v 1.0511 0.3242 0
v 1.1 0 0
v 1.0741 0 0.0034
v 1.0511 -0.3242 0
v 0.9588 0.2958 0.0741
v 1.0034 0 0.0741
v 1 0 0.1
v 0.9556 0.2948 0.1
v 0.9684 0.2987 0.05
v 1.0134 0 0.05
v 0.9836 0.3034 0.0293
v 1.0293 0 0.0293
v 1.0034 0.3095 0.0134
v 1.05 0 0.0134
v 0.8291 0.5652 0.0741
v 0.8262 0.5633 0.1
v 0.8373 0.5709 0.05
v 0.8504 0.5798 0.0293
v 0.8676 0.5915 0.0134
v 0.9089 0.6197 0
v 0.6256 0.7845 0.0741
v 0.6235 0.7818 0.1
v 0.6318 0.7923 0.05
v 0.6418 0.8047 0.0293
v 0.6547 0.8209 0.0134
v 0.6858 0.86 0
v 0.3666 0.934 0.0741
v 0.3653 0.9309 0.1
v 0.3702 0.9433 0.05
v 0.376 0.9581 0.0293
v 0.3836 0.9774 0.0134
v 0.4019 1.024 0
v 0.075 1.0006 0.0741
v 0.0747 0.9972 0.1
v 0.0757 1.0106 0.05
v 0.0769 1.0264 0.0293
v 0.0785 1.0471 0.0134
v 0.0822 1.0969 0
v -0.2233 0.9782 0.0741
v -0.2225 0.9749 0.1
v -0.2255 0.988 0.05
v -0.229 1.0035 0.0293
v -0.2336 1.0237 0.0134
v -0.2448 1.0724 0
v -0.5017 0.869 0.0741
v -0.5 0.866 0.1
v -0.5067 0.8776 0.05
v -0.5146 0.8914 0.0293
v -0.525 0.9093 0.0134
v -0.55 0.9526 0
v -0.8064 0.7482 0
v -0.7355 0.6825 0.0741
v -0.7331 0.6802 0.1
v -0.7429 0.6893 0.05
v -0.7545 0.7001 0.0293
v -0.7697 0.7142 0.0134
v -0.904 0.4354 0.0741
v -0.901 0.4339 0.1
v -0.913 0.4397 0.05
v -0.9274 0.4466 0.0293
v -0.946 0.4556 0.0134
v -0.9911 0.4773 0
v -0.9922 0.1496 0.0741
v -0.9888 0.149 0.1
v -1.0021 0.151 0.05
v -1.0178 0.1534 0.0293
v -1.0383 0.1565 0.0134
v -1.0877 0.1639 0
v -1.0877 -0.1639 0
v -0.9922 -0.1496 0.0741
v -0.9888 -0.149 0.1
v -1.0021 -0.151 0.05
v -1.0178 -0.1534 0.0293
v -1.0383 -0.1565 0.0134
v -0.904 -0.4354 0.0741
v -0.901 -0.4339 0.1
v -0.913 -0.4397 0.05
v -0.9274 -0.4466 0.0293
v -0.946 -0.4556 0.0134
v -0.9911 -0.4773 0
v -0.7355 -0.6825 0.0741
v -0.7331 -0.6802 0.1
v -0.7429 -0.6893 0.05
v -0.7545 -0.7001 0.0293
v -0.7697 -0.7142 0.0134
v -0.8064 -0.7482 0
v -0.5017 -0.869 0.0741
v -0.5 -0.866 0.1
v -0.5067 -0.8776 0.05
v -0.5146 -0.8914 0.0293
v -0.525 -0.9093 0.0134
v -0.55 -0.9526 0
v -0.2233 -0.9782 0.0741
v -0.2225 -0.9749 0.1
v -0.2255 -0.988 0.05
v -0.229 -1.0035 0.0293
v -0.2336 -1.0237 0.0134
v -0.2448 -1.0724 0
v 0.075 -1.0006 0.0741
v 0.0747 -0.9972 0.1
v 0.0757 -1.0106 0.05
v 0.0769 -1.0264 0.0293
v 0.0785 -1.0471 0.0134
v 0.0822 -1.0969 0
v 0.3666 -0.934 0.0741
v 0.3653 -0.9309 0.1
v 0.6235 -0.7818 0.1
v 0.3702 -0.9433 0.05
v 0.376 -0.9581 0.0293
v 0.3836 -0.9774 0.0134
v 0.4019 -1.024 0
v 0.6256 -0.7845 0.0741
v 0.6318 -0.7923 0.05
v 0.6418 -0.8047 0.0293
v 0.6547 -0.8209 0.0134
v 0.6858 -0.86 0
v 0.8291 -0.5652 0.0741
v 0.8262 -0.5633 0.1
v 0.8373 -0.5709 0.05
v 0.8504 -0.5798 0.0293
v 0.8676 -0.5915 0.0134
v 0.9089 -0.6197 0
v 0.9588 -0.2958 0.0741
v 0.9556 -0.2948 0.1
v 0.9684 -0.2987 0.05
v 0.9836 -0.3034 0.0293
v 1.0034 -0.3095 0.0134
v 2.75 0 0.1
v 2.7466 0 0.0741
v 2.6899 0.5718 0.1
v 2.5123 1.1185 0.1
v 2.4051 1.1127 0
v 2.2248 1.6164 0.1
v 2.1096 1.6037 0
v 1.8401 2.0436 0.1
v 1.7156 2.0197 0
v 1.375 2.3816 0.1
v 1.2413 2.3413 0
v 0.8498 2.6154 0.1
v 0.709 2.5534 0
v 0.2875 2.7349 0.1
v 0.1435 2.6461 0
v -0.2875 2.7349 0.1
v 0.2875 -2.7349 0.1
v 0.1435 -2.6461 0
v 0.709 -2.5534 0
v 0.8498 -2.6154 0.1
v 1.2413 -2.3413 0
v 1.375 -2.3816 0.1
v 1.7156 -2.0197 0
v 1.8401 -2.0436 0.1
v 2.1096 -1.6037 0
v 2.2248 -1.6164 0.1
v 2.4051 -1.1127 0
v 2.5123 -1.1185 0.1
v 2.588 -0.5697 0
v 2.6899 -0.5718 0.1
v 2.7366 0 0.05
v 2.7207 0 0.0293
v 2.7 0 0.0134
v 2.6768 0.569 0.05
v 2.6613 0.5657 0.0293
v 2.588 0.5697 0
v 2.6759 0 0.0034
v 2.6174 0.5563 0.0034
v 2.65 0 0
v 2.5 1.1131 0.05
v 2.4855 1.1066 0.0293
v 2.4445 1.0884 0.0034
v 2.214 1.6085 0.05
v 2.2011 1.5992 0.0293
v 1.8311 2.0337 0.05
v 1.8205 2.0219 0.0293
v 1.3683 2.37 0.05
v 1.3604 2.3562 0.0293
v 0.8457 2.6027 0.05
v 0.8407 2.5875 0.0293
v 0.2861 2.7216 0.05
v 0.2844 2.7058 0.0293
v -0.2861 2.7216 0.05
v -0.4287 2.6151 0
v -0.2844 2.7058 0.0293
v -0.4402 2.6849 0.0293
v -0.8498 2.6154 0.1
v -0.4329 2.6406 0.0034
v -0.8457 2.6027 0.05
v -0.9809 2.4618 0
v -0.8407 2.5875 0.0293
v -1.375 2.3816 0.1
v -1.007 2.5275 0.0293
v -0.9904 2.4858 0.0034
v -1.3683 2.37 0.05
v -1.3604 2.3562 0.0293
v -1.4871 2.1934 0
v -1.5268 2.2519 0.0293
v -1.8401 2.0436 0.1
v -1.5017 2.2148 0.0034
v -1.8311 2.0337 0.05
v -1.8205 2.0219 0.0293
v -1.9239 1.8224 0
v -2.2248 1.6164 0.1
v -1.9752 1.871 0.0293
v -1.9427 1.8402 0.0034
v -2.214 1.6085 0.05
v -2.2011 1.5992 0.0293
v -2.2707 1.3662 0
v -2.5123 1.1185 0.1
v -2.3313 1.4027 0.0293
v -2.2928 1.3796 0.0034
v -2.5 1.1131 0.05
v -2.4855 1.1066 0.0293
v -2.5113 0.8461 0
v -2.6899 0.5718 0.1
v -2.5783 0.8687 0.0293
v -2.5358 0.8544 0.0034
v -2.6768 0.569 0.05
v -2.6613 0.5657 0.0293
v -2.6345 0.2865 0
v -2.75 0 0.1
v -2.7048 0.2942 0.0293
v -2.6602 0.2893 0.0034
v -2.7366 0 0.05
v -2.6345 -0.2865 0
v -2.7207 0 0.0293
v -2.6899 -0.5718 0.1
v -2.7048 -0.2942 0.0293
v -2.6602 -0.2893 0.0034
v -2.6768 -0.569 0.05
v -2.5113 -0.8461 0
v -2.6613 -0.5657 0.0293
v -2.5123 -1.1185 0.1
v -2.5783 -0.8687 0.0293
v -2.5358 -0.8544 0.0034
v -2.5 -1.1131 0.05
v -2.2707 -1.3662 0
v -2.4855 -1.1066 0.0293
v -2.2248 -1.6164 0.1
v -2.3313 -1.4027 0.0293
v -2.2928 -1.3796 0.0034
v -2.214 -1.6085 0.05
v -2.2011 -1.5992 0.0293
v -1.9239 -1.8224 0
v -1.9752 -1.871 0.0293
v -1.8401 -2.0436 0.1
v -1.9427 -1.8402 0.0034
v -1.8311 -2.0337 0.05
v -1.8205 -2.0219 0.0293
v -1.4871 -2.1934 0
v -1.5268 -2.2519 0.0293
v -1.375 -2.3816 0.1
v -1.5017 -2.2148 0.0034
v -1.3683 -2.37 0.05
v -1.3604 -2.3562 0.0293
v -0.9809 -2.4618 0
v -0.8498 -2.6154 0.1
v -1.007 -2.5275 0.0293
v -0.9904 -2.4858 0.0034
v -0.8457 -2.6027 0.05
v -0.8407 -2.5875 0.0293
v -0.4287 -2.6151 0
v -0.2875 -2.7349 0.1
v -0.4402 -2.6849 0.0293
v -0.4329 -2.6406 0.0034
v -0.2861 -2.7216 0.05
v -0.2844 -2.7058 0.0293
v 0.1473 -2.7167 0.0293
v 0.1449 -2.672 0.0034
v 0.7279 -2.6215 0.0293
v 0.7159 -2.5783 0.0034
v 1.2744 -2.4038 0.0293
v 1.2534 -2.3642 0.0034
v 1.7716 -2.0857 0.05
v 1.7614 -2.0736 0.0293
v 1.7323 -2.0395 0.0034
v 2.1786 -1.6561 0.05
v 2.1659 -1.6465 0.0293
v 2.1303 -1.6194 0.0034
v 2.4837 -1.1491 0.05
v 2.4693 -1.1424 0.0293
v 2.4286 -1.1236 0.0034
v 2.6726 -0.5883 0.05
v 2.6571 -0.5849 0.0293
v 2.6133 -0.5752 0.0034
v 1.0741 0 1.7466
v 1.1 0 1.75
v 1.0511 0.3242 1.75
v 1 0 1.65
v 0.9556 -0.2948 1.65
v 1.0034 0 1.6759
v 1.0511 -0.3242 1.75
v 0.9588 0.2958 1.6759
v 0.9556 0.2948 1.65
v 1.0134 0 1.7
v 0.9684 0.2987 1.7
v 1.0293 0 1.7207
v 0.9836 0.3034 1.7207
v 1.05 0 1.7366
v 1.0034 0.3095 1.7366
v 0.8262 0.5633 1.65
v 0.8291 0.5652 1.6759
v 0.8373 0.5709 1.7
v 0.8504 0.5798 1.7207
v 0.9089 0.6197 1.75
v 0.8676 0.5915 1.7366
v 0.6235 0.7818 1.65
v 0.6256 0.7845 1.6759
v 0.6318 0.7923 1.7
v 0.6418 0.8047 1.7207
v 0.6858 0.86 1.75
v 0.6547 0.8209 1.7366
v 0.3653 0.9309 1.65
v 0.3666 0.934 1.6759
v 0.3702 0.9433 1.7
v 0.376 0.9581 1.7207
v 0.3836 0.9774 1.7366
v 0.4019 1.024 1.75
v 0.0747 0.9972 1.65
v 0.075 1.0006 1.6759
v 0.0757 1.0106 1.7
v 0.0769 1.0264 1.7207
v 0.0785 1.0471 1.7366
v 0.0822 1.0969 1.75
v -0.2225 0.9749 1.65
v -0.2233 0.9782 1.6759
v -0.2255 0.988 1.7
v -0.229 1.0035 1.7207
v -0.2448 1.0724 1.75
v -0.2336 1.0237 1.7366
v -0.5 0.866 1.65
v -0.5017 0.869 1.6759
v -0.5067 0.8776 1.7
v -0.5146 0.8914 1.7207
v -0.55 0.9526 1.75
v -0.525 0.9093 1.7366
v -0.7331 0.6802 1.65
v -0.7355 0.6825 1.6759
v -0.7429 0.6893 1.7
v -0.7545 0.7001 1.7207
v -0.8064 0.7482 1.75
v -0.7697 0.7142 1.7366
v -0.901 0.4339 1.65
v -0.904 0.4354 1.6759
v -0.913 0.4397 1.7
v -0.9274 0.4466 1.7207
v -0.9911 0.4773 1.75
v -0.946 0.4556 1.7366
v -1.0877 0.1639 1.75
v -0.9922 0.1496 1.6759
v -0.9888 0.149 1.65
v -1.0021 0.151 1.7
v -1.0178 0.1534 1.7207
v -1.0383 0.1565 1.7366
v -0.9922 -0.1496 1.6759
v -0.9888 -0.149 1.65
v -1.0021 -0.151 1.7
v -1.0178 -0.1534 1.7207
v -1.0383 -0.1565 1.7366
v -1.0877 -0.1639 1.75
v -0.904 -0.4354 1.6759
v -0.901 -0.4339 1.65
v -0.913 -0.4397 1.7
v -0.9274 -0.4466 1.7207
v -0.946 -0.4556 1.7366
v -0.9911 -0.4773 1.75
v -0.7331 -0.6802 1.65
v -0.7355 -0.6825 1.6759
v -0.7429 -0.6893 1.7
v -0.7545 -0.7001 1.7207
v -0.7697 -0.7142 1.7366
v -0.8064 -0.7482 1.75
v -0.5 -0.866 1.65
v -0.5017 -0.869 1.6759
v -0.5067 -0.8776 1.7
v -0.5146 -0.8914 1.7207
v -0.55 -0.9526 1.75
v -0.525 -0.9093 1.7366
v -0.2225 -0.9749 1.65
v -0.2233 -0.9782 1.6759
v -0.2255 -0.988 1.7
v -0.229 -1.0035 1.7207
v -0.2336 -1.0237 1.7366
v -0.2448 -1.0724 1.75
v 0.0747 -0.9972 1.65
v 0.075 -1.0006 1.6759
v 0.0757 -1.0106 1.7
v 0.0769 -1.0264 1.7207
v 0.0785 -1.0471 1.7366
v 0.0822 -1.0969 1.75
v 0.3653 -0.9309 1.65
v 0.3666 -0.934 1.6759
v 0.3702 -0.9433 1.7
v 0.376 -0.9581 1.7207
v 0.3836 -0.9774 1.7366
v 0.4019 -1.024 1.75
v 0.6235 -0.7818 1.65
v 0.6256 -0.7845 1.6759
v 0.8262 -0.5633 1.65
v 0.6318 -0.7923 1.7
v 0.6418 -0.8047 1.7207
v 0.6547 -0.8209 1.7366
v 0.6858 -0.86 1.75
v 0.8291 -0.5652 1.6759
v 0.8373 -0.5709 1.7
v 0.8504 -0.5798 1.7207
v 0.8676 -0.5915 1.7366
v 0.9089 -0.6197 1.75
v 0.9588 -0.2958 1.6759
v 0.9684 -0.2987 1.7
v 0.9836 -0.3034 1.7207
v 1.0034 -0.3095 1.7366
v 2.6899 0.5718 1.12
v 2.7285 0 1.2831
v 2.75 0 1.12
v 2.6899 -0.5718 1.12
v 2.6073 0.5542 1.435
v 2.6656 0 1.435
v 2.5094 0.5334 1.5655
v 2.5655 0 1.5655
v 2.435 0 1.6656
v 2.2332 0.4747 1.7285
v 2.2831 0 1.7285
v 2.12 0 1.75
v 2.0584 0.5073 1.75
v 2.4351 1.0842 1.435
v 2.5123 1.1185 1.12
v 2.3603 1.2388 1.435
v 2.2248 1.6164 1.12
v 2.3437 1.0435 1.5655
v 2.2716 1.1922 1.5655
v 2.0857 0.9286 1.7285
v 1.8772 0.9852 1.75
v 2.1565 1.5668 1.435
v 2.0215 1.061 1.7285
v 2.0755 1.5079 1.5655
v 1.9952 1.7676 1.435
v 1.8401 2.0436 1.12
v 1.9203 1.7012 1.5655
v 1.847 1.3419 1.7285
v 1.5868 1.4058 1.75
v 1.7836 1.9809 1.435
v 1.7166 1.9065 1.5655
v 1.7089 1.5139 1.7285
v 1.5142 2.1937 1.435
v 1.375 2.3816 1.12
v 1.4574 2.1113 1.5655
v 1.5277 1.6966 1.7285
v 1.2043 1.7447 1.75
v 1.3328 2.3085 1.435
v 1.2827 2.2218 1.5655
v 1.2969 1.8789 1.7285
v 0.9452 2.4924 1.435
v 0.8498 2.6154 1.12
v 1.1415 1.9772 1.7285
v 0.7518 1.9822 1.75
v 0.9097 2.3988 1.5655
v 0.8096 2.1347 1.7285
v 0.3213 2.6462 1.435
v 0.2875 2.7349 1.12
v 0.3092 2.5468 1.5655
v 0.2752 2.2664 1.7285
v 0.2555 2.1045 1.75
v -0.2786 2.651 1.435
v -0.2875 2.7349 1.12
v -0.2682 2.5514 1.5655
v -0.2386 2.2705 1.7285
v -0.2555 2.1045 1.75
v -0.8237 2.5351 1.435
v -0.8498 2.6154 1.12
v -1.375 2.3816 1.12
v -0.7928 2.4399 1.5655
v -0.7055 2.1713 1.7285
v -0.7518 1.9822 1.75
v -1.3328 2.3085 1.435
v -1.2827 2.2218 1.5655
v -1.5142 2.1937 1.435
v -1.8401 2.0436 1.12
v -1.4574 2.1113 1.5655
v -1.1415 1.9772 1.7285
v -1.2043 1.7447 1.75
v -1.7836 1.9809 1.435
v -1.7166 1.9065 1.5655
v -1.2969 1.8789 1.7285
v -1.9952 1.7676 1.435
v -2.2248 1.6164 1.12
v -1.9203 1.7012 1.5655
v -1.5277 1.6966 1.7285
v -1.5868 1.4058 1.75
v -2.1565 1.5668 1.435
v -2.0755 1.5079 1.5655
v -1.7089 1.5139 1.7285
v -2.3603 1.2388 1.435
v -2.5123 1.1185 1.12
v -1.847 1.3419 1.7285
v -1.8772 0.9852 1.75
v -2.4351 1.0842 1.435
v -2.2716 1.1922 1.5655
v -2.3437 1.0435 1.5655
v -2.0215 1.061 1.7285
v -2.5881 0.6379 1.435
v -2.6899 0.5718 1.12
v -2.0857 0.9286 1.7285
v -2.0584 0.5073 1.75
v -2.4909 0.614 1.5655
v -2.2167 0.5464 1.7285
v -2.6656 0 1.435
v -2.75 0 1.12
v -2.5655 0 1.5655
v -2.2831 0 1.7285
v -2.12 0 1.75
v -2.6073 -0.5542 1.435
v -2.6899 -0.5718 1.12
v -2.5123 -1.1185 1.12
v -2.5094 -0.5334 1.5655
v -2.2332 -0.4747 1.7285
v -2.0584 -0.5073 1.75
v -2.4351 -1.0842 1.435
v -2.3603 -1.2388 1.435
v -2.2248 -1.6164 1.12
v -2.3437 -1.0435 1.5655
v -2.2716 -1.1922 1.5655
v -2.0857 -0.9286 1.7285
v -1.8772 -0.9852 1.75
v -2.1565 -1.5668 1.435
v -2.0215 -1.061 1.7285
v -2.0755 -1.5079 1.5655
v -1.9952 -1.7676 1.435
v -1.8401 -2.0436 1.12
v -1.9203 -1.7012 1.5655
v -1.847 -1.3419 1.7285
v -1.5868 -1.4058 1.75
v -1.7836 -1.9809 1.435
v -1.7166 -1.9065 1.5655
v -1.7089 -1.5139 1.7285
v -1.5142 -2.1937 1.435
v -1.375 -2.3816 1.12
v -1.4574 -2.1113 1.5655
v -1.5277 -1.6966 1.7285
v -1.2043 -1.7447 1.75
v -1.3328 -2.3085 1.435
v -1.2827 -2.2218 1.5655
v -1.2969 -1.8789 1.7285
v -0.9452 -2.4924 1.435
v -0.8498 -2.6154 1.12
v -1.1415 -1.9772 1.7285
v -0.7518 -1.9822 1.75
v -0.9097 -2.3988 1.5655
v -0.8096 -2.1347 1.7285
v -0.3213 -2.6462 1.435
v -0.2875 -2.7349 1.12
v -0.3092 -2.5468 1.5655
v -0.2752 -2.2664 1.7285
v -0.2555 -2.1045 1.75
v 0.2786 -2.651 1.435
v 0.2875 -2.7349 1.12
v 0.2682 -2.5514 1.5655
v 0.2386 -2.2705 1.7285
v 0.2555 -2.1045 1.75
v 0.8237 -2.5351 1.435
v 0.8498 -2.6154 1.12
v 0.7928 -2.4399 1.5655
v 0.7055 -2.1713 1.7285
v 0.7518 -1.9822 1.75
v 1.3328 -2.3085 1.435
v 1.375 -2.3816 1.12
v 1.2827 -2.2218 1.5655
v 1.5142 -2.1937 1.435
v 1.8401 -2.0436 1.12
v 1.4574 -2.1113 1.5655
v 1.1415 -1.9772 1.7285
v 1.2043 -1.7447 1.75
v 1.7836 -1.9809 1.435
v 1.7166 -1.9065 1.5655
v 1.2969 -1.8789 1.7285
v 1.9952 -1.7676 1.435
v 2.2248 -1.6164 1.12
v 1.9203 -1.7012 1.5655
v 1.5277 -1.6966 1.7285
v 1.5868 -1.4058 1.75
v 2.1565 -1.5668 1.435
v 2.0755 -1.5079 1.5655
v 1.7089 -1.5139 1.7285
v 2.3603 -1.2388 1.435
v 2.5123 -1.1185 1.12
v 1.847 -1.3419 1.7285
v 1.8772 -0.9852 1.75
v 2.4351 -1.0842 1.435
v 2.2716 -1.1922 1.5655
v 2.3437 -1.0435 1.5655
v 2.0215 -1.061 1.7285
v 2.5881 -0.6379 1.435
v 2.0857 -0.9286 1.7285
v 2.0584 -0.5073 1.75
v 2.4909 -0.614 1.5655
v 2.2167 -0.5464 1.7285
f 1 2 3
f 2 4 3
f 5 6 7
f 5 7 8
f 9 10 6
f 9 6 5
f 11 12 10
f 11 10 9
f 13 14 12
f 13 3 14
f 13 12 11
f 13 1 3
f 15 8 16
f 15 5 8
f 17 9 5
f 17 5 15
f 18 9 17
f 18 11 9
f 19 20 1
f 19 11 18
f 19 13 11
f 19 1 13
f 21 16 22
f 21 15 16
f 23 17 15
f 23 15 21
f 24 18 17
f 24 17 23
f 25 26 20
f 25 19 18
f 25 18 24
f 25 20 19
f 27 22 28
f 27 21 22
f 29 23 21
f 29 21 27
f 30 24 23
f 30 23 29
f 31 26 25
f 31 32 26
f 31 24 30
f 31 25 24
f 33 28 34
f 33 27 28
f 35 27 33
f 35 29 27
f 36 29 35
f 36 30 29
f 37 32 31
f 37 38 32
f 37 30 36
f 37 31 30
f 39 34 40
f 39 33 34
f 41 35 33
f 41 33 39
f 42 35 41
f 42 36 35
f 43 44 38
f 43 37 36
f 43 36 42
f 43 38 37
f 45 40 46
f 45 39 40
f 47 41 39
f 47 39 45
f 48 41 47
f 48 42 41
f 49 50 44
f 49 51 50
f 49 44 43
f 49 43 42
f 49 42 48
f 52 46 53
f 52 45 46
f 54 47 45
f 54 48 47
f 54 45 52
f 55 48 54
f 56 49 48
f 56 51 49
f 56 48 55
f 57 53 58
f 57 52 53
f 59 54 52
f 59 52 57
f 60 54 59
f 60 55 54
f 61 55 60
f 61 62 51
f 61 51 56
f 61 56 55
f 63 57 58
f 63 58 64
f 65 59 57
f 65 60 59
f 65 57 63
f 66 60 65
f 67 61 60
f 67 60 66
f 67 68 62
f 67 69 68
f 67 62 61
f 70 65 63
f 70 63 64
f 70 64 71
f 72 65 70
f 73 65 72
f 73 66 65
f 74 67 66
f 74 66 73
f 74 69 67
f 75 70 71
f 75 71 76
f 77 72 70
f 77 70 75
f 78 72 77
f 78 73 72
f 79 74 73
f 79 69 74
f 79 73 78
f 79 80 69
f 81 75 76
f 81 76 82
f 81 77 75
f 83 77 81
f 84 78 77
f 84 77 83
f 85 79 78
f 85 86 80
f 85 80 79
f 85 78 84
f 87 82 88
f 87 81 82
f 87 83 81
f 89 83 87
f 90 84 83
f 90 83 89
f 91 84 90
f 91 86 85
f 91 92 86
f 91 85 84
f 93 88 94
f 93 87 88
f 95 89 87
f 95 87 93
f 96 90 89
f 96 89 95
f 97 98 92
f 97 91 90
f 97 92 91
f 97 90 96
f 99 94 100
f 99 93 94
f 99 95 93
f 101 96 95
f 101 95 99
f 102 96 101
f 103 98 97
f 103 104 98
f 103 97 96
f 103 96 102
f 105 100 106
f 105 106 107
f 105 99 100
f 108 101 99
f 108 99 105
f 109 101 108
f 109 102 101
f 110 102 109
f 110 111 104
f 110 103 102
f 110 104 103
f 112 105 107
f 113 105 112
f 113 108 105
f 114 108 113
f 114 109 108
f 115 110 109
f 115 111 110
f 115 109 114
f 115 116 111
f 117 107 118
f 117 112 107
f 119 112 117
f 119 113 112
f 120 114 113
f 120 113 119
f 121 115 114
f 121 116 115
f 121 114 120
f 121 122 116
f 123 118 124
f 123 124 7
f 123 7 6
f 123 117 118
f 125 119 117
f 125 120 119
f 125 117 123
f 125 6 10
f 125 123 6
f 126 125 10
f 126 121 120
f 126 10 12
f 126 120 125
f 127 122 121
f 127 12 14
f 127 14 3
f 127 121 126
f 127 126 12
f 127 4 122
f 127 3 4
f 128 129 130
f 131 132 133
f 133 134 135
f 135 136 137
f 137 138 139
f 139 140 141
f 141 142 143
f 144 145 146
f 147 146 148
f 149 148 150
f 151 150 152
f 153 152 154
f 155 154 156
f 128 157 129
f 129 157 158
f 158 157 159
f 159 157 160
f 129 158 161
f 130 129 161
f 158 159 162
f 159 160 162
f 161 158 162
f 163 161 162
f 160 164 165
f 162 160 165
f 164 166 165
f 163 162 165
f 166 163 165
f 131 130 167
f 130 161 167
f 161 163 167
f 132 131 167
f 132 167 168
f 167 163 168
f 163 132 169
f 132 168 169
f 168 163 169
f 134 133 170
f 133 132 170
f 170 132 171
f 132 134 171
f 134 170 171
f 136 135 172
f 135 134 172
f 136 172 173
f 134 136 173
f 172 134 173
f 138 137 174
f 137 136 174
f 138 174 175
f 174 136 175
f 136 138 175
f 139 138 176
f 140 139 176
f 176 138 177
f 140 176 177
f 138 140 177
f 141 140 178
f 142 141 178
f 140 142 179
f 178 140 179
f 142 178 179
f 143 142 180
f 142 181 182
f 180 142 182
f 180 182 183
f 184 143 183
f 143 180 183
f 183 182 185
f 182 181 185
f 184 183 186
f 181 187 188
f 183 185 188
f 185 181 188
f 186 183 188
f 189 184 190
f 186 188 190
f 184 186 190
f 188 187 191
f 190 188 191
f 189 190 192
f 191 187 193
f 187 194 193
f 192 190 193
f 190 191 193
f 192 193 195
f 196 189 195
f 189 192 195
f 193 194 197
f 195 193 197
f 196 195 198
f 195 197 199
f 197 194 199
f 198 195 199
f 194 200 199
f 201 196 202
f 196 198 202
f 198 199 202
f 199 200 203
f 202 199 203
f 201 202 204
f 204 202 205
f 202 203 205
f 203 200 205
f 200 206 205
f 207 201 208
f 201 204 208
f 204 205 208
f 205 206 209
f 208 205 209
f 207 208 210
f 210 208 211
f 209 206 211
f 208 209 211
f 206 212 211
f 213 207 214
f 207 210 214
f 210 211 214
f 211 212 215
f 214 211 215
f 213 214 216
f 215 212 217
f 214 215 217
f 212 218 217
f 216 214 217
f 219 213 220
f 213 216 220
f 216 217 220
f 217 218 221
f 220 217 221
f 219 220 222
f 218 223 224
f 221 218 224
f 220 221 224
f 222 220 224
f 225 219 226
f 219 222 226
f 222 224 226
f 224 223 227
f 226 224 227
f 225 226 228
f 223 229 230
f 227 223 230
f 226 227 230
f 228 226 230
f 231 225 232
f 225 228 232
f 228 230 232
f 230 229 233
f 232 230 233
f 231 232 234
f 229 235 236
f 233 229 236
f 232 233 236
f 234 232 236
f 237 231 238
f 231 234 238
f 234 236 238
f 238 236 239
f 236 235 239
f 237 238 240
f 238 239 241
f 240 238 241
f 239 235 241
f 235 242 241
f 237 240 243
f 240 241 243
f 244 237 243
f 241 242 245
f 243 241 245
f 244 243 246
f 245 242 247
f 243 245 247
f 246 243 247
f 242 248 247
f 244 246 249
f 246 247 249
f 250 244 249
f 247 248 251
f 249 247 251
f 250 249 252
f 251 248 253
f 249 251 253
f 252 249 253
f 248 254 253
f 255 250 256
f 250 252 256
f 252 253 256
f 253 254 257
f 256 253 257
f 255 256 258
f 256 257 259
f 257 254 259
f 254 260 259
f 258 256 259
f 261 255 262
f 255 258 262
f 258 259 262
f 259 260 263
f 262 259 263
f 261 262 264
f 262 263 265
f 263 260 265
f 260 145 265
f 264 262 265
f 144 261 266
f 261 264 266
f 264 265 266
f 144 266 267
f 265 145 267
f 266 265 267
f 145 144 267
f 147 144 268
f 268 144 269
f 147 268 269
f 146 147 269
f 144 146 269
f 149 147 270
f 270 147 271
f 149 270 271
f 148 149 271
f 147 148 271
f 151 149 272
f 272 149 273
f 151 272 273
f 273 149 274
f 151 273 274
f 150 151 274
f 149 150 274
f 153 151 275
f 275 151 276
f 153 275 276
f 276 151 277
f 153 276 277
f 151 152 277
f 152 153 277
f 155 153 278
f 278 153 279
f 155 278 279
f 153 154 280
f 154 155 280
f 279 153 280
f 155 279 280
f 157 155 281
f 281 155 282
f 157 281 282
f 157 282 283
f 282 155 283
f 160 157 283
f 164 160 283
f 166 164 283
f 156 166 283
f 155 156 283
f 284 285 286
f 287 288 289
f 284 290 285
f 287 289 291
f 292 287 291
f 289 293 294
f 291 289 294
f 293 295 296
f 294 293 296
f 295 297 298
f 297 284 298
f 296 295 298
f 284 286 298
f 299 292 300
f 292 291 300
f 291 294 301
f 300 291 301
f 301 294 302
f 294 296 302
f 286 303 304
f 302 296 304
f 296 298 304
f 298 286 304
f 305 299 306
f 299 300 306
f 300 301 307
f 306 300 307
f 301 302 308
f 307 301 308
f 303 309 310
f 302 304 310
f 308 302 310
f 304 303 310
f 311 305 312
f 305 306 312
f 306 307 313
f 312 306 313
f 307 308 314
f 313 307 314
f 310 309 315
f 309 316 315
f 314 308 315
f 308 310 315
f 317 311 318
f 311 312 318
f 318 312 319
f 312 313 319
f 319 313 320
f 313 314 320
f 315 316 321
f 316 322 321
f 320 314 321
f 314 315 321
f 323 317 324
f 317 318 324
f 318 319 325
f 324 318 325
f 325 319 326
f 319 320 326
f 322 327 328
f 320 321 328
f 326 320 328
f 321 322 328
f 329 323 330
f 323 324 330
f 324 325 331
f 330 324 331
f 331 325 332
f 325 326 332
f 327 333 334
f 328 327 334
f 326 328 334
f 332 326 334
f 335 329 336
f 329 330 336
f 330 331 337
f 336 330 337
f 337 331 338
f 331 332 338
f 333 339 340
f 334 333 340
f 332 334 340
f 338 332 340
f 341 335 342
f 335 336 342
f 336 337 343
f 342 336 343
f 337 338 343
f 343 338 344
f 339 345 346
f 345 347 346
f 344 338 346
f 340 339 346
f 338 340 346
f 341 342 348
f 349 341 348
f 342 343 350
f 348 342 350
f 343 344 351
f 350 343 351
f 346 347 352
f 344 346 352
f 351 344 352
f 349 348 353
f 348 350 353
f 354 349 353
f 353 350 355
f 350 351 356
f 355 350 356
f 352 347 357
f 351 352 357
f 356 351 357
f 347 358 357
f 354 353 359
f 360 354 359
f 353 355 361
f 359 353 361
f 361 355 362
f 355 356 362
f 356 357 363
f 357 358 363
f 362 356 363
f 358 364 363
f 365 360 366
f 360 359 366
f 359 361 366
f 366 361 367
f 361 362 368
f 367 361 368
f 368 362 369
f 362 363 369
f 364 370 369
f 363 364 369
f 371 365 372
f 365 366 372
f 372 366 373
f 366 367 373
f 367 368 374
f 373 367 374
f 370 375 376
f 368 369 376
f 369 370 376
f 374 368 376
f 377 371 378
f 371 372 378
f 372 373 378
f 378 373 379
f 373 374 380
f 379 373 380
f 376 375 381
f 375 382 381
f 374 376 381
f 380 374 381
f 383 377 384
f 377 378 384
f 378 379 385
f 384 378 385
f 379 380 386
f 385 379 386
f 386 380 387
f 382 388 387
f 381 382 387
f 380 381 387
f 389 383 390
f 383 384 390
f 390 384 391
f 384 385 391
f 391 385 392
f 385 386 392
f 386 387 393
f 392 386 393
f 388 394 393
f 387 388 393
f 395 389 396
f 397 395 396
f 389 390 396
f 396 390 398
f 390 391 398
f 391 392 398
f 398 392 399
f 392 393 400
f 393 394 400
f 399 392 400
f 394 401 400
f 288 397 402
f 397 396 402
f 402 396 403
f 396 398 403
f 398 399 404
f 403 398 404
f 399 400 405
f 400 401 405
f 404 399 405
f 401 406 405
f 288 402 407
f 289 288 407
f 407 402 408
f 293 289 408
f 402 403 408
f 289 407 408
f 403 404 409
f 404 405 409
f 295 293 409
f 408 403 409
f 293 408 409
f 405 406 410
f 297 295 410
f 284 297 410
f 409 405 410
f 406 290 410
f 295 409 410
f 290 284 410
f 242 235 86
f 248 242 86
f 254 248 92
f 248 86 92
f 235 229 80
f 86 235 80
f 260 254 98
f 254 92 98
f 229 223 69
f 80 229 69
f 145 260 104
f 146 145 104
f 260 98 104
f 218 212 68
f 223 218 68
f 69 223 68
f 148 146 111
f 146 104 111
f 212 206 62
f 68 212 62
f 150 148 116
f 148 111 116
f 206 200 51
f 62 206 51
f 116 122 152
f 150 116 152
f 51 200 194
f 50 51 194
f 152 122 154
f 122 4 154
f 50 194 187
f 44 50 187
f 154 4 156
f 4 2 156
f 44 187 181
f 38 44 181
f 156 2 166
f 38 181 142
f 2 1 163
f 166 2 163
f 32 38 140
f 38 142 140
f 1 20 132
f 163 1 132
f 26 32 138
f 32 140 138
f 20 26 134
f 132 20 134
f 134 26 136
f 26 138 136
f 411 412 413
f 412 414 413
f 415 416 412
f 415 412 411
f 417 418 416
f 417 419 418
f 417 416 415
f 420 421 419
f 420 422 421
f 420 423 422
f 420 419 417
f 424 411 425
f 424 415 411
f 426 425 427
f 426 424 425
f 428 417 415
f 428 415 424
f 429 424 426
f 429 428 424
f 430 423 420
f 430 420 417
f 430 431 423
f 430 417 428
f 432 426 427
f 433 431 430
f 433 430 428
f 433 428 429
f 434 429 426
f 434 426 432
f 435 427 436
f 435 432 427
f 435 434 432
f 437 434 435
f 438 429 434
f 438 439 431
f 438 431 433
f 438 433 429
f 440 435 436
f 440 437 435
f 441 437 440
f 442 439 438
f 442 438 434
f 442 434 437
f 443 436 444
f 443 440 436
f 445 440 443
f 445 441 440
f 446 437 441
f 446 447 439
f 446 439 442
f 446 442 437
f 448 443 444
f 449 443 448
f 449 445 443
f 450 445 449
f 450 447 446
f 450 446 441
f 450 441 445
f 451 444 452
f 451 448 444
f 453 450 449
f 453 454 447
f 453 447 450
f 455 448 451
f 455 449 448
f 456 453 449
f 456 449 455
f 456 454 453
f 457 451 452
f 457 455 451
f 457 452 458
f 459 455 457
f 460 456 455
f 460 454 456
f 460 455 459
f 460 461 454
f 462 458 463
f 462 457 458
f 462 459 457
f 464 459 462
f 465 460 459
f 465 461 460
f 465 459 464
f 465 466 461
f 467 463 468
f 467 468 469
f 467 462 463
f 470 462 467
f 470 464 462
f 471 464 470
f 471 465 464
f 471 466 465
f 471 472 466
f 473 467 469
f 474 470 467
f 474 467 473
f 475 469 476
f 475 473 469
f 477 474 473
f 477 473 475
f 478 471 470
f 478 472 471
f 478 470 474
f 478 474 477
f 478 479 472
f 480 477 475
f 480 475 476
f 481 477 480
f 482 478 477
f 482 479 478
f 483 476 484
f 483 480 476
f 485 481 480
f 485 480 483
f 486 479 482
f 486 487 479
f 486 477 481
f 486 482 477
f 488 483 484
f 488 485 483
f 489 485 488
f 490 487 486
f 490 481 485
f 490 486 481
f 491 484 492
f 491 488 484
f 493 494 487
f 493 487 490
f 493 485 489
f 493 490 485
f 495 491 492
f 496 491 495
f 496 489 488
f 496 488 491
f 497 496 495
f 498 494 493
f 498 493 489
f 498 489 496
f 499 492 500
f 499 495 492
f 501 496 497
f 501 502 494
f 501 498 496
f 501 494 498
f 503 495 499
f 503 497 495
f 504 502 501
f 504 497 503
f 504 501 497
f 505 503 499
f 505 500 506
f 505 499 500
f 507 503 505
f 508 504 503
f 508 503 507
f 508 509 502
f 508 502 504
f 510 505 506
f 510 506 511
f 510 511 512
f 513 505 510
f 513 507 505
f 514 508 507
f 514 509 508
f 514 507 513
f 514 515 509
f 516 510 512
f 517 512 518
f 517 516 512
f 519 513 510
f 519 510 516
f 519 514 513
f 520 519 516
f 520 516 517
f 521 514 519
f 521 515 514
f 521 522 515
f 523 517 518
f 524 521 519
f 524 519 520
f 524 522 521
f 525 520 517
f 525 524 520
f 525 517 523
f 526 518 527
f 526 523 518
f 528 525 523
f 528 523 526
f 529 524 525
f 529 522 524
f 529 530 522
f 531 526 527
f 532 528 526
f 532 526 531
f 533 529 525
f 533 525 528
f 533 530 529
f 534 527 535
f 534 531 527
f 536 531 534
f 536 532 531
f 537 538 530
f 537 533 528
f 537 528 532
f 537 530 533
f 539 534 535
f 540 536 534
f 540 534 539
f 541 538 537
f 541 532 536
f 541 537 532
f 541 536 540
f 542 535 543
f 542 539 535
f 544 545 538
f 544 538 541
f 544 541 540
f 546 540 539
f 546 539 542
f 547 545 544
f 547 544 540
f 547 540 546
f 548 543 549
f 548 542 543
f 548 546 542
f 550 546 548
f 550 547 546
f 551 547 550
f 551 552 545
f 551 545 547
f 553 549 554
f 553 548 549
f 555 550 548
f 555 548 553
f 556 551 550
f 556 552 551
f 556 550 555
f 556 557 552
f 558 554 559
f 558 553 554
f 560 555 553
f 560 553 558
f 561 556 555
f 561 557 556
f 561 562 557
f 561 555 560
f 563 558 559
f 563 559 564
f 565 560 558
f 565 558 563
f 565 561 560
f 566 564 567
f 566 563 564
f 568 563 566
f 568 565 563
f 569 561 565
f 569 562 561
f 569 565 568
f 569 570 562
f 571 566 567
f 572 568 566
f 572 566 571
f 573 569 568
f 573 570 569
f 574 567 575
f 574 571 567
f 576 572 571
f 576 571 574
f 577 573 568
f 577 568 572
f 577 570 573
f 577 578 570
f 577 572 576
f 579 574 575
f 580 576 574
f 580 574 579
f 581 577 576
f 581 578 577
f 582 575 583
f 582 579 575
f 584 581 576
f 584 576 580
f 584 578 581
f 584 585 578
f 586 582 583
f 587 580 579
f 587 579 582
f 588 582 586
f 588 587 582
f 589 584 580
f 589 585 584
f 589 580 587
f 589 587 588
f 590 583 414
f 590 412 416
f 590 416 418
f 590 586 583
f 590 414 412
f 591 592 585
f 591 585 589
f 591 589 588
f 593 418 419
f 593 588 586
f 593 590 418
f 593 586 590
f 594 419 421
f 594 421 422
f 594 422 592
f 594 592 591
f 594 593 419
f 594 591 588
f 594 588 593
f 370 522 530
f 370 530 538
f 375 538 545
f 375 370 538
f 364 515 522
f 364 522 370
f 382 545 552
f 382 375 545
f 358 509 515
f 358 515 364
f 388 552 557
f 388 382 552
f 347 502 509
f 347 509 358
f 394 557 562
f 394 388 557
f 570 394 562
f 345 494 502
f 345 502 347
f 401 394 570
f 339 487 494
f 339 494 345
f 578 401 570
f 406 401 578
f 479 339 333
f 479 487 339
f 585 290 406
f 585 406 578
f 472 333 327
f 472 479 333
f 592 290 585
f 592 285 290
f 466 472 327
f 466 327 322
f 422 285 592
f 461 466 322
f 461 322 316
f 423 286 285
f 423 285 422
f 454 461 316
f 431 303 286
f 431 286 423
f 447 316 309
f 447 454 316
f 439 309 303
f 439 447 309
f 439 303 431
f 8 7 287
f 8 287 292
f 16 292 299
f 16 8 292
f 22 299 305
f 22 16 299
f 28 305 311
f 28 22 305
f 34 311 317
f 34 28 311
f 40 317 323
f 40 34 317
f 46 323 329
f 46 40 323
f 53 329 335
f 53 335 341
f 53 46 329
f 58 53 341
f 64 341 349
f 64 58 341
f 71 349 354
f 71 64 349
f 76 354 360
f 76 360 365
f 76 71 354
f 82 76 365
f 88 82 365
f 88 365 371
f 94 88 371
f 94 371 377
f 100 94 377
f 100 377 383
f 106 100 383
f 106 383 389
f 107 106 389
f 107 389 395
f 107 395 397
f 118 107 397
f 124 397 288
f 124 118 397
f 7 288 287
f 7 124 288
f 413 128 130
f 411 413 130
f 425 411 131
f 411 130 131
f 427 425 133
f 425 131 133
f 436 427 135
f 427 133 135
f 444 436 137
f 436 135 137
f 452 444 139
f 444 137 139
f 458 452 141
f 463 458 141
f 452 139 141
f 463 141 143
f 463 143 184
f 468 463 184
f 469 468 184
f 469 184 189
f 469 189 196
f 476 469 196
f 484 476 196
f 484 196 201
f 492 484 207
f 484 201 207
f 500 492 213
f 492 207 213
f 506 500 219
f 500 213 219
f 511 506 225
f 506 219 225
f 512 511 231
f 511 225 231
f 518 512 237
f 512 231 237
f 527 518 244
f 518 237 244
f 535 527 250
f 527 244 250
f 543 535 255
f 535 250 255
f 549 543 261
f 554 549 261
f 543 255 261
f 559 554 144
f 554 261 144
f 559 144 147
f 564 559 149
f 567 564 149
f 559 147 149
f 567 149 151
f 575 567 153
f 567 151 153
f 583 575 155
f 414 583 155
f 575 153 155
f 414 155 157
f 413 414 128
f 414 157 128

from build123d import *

# Parameters (mm, degrees)
SKETCH1_R           = 2.75
SKETCH1_R_2         = 1
EXTRUDE_THIN1_DEPTH = 1.75
FILLET1_R           = 0.1
FILLET2_R           = 0.63


with BuildPart() as part:
    # Sketch1 → Extrude-Thin1 (new body)
    with BuildSketch(Plane.XY):
        Circle(SKETCH1_R)
        Circle(SKETCH1_R_2, mode=Mode.SUBTRACT)
    extrude(amount=EXTRUDE_THIN1_DEPTH)

    # Fillet1
    fillet1_edges = [part.edges().sort_by_distance(p)[0] for p in [
        (-2.75, 0, 0),
        (-1, 0, 0),
        (-1, 0, 1.75),
    ]]
    fillet(fillet1_edges, radius=FILLET1_R)

    # Fillet2
    fillet2_edges = [part.edges().sort_by_distance(p)[0] for p in [
        (-2.75, 0, 1.75),
    ]]
    fillet(fillet2_edges, radius=FILLET2_R)


solid = part.part
